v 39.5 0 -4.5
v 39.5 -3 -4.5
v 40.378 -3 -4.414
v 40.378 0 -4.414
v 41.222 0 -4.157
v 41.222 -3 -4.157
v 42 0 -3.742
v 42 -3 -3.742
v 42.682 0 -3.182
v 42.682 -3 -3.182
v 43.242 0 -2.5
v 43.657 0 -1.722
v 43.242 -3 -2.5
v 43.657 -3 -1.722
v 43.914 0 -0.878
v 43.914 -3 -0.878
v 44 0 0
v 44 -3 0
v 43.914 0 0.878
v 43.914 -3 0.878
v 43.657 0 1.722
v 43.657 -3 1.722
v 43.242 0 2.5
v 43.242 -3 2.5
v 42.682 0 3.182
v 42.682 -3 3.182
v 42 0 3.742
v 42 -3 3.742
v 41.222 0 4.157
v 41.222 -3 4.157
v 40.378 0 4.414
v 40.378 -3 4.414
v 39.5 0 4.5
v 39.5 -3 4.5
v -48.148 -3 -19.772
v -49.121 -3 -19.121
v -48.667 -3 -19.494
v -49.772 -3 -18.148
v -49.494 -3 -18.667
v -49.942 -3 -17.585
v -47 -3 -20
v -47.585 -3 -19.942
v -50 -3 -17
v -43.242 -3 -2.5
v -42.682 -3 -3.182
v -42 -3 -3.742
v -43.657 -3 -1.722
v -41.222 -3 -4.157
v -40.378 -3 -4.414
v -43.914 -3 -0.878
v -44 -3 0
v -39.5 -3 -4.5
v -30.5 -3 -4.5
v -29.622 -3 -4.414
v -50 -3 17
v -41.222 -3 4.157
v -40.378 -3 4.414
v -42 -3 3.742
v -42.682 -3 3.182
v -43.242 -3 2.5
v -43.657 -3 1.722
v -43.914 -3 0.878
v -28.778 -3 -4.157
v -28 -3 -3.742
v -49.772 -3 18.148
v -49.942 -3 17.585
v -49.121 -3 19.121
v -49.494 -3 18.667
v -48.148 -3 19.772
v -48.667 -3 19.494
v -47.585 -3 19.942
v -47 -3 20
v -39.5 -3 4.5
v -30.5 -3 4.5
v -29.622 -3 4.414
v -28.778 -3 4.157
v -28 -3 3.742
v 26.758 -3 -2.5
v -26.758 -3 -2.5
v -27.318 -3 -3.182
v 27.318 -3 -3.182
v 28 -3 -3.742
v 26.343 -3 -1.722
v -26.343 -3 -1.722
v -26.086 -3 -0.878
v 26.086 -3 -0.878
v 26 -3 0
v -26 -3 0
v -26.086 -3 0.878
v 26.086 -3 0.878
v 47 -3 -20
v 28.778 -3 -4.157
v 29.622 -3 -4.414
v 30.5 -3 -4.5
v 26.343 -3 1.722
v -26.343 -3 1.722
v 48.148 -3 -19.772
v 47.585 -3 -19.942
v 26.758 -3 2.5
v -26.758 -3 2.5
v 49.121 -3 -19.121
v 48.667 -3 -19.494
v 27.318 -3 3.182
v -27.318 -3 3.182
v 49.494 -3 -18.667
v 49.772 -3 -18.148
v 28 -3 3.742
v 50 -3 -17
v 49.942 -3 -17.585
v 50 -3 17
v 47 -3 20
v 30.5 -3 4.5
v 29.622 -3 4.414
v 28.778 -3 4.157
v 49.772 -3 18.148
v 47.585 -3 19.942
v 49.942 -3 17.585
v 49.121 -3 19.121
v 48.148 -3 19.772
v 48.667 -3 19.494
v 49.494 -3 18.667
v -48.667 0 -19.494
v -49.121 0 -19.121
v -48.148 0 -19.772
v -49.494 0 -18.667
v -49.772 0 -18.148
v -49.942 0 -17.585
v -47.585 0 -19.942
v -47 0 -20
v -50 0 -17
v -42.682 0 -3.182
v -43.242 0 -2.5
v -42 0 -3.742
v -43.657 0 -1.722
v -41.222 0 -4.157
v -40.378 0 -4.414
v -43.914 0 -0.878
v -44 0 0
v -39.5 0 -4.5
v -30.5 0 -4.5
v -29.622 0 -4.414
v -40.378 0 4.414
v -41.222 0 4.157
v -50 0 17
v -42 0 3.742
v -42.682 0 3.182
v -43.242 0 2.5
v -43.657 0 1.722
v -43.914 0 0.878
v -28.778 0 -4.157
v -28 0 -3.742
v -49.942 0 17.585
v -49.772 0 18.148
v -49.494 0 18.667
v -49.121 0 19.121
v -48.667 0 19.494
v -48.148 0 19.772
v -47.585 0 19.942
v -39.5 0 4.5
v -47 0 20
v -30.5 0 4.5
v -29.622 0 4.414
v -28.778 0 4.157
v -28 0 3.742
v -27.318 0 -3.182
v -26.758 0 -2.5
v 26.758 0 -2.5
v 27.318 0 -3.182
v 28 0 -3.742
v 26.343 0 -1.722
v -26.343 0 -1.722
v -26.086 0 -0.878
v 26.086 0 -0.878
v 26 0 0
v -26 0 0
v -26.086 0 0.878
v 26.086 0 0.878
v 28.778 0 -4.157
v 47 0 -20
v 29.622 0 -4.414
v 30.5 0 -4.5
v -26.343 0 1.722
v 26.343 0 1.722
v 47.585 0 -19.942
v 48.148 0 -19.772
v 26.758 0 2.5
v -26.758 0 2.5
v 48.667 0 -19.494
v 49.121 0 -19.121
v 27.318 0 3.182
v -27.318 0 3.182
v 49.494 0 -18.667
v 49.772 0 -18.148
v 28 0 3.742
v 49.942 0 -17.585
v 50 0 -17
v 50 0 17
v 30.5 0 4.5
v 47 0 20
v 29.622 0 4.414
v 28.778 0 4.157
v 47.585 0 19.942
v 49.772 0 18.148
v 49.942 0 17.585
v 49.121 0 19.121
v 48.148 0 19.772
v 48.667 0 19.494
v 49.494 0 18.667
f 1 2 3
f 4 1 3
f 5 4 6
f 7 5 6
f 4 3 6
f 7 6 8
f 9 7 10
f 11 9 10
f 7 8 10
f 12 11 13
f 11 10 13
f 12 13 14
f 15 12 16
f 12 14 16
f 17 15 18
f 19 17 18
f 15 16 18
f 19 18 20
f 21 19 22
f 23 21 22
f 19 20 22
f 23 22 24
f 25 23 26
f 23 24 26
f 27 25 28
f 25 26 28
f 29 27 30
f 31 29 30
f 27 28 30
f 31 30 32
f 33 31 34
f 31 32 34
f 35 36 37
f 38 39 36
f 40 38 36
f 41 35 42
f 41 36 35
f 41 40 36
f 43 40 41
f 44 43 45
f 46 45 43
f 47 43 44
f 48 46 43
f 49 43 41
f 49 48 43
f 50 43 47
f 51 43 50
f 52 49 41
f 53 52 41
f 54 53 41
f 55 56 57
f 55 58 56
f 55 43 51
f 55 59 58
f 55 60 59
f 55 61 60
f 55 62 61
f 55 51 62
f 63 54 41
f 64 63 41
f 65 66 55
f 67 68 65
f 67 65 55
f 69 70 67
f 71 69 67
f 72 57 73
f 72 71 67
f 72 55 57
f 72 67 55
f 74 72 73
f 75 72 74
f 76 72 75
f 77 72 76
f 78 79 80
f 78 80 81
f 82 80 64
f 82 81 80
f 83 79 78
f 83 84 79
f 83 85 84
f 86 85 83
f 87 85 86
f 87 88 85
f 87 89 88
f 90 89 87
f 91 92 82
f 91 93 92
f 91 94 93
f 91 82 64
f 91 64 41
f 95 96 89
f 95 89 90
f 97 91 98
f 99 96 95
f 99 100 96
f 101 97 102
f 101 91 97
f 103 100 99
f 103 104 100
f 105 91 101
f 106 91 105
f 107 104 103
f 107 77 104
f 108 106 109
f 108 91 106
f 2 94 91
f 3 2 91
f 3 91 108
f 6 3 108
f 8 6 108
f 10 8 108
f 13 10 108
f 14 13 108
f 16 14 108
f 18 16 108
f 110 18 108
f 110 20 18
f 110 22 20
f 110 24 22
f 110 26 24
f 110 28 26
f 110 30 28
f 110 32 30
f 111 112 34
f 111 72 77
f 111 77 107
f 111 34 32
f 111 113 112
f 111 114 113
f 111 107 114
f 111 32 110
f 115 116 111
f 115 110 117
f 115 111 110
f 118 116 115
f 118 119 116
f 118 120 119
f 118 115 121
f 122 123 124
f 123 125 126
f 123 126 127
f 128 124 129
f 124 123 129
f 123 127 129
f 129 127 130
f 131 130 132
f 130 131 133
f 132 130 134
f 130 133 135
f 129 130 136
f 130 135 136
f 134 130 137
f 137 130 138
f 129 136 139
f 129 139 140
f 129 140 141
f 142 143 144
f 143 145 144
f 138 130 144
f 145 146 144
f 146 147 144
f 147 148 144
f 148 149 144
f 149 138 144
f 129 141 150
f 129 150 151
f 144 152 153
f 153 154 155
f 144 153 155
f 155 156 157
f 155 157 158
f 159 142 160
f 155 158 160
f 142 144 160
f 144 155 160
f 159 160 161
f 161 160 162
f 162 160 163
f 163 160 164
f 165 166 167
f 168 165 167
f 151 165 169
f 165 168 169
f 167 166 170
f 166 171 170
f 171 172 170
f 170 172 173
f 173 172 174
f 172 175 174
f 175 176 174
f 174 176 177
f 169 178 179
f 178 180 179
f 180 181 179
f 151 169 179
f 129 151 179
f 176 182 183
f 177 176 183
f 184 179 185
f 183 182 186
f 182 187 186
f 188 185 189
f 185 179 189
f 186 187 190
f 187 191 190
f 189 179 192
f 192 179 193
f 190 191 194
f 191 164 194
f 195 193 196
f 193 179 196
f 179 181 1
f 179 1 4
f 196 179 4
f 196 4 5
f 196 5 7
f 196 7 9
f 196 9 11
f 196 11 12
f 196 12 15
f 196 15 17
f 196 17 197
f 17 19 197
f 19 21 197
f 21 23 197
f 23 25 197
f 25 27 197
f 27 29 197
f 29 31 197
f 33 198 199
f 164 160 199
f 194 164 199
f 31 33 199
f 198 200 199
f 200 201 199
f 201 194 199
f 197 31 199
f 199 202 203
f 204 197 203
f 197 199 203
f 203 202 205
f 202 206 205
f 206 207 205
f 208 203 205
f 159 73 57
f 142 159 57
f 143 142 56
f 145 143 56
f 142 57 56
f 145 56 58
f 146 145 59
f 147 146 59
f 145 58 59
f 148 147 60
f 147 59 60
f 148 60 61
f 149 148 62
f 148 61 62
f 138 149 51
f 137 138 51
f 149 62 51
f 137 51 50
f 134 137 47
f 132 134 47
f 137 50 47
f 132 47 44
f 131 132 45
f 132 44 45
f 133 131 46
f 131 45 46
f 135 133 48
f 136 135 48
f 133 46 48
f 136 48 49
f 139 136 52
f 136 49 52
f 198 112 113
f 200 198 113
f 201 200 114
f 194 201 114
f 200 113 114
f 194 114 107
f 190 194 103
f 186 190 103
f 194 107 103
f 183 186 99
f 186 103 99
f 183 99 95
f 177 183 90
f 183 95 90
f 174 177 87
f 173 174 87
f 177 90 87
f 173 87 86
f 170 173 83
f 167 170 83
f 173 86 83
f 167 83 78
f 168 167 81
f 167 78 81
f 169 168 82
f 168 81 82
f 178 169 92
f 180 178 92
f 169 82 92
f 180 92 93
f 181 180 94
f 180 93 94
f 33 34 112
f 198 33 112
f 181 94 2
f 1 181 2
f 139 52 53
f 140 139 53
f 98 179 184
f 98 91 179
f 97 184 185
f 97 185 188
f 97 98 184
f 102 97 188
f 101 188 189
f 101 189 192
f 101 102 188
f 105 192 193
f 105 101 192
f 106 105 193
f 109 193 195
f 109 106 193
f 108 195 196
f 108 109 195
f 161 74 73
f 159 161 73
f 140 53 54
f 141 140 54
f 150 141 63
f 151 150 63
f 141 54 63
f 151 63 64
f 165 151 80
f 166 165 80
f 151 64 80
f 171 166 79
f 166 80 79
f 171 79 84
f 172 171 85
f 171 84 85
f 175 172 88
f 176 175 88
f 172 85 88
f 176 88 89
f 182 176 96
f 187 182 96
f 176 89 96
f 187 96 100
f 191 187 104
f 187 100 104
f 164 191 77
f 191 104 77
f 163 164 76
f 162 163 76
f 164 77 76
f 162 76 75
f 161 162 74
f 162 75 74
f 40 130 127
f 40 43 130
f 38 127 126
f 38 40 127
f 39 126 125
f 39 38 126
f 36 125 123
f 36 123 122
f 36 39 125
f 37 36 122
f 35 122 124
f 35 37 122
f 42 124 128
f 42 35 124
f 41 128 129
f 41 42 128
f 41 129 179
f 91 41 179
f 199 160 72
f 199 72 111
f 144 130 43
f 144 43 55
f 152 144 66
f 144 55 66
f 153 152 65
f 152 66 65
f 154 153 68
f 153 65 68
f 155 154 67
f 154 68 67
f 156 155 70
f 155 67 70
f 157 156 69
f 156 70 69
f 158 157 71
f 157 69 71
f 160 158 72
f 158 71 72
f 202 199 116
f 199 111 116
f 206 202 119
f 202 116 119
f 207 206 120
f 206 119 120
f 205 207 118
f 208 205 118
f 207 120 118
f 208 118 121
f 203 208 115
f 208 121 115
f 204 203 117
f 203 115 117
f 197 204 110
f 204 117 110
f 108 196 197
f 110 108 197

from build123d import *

# Parameters (mm, degrees)
F0_W     = 100
F0_H     = 40
F1_DEPTH = 3
F3_DEPTH = 25
F4_R     = 3


with BuildPart() as f1:
    # F0 (on Front) → F1 (new body)
    with BuildSketch(Plane.XZ):
        Rectangle(F0_W, F0_H)
    extrude(amount=F1_DEPTH)

    # F2 (on face) → F3 (cut)
    with BuildSketch(Plane.XZ.offset(3)):
        with BuildLine():
            ThreePointArc((39.5, -4.5), (44, 0), (39.5, 4.5))
            Line((39.5, 4.5), (30.5, 4.5))
            ThreePointArc((30.5, 4.5), (26, 0), (30.5, -4.5))
            Line((30.5, -4.5), (39.5, -4.5))
        make_face()
        with BuildLine():
            ThreePointArc((-39.5, 4.5), (-44, 0), (-39.5, -4.5))
            Line((-39.5, -4.5), (-30.5, -4.5))
            ThreePointArc((-30.5, -4.5), (-26, 0), (-30.5, 4.5))
            Line((-30.5, 4.5), (-39.5, 4.5))
        make_face()
    extrude(amount=-F3_DEPTH, mode=Mode.SUBTRACT)

    # F4
    f4_edges = [f1.edges().sort_by_distance(p)[0] for p in [
        (50, -1.5, -20),
        (50, -1.5, 20),
        (-50, -1.5, 20),
        (-50, -1.5, -20),
    ]]
    fillet(f4_edges, radius=F4_R)


solid = f1.part
